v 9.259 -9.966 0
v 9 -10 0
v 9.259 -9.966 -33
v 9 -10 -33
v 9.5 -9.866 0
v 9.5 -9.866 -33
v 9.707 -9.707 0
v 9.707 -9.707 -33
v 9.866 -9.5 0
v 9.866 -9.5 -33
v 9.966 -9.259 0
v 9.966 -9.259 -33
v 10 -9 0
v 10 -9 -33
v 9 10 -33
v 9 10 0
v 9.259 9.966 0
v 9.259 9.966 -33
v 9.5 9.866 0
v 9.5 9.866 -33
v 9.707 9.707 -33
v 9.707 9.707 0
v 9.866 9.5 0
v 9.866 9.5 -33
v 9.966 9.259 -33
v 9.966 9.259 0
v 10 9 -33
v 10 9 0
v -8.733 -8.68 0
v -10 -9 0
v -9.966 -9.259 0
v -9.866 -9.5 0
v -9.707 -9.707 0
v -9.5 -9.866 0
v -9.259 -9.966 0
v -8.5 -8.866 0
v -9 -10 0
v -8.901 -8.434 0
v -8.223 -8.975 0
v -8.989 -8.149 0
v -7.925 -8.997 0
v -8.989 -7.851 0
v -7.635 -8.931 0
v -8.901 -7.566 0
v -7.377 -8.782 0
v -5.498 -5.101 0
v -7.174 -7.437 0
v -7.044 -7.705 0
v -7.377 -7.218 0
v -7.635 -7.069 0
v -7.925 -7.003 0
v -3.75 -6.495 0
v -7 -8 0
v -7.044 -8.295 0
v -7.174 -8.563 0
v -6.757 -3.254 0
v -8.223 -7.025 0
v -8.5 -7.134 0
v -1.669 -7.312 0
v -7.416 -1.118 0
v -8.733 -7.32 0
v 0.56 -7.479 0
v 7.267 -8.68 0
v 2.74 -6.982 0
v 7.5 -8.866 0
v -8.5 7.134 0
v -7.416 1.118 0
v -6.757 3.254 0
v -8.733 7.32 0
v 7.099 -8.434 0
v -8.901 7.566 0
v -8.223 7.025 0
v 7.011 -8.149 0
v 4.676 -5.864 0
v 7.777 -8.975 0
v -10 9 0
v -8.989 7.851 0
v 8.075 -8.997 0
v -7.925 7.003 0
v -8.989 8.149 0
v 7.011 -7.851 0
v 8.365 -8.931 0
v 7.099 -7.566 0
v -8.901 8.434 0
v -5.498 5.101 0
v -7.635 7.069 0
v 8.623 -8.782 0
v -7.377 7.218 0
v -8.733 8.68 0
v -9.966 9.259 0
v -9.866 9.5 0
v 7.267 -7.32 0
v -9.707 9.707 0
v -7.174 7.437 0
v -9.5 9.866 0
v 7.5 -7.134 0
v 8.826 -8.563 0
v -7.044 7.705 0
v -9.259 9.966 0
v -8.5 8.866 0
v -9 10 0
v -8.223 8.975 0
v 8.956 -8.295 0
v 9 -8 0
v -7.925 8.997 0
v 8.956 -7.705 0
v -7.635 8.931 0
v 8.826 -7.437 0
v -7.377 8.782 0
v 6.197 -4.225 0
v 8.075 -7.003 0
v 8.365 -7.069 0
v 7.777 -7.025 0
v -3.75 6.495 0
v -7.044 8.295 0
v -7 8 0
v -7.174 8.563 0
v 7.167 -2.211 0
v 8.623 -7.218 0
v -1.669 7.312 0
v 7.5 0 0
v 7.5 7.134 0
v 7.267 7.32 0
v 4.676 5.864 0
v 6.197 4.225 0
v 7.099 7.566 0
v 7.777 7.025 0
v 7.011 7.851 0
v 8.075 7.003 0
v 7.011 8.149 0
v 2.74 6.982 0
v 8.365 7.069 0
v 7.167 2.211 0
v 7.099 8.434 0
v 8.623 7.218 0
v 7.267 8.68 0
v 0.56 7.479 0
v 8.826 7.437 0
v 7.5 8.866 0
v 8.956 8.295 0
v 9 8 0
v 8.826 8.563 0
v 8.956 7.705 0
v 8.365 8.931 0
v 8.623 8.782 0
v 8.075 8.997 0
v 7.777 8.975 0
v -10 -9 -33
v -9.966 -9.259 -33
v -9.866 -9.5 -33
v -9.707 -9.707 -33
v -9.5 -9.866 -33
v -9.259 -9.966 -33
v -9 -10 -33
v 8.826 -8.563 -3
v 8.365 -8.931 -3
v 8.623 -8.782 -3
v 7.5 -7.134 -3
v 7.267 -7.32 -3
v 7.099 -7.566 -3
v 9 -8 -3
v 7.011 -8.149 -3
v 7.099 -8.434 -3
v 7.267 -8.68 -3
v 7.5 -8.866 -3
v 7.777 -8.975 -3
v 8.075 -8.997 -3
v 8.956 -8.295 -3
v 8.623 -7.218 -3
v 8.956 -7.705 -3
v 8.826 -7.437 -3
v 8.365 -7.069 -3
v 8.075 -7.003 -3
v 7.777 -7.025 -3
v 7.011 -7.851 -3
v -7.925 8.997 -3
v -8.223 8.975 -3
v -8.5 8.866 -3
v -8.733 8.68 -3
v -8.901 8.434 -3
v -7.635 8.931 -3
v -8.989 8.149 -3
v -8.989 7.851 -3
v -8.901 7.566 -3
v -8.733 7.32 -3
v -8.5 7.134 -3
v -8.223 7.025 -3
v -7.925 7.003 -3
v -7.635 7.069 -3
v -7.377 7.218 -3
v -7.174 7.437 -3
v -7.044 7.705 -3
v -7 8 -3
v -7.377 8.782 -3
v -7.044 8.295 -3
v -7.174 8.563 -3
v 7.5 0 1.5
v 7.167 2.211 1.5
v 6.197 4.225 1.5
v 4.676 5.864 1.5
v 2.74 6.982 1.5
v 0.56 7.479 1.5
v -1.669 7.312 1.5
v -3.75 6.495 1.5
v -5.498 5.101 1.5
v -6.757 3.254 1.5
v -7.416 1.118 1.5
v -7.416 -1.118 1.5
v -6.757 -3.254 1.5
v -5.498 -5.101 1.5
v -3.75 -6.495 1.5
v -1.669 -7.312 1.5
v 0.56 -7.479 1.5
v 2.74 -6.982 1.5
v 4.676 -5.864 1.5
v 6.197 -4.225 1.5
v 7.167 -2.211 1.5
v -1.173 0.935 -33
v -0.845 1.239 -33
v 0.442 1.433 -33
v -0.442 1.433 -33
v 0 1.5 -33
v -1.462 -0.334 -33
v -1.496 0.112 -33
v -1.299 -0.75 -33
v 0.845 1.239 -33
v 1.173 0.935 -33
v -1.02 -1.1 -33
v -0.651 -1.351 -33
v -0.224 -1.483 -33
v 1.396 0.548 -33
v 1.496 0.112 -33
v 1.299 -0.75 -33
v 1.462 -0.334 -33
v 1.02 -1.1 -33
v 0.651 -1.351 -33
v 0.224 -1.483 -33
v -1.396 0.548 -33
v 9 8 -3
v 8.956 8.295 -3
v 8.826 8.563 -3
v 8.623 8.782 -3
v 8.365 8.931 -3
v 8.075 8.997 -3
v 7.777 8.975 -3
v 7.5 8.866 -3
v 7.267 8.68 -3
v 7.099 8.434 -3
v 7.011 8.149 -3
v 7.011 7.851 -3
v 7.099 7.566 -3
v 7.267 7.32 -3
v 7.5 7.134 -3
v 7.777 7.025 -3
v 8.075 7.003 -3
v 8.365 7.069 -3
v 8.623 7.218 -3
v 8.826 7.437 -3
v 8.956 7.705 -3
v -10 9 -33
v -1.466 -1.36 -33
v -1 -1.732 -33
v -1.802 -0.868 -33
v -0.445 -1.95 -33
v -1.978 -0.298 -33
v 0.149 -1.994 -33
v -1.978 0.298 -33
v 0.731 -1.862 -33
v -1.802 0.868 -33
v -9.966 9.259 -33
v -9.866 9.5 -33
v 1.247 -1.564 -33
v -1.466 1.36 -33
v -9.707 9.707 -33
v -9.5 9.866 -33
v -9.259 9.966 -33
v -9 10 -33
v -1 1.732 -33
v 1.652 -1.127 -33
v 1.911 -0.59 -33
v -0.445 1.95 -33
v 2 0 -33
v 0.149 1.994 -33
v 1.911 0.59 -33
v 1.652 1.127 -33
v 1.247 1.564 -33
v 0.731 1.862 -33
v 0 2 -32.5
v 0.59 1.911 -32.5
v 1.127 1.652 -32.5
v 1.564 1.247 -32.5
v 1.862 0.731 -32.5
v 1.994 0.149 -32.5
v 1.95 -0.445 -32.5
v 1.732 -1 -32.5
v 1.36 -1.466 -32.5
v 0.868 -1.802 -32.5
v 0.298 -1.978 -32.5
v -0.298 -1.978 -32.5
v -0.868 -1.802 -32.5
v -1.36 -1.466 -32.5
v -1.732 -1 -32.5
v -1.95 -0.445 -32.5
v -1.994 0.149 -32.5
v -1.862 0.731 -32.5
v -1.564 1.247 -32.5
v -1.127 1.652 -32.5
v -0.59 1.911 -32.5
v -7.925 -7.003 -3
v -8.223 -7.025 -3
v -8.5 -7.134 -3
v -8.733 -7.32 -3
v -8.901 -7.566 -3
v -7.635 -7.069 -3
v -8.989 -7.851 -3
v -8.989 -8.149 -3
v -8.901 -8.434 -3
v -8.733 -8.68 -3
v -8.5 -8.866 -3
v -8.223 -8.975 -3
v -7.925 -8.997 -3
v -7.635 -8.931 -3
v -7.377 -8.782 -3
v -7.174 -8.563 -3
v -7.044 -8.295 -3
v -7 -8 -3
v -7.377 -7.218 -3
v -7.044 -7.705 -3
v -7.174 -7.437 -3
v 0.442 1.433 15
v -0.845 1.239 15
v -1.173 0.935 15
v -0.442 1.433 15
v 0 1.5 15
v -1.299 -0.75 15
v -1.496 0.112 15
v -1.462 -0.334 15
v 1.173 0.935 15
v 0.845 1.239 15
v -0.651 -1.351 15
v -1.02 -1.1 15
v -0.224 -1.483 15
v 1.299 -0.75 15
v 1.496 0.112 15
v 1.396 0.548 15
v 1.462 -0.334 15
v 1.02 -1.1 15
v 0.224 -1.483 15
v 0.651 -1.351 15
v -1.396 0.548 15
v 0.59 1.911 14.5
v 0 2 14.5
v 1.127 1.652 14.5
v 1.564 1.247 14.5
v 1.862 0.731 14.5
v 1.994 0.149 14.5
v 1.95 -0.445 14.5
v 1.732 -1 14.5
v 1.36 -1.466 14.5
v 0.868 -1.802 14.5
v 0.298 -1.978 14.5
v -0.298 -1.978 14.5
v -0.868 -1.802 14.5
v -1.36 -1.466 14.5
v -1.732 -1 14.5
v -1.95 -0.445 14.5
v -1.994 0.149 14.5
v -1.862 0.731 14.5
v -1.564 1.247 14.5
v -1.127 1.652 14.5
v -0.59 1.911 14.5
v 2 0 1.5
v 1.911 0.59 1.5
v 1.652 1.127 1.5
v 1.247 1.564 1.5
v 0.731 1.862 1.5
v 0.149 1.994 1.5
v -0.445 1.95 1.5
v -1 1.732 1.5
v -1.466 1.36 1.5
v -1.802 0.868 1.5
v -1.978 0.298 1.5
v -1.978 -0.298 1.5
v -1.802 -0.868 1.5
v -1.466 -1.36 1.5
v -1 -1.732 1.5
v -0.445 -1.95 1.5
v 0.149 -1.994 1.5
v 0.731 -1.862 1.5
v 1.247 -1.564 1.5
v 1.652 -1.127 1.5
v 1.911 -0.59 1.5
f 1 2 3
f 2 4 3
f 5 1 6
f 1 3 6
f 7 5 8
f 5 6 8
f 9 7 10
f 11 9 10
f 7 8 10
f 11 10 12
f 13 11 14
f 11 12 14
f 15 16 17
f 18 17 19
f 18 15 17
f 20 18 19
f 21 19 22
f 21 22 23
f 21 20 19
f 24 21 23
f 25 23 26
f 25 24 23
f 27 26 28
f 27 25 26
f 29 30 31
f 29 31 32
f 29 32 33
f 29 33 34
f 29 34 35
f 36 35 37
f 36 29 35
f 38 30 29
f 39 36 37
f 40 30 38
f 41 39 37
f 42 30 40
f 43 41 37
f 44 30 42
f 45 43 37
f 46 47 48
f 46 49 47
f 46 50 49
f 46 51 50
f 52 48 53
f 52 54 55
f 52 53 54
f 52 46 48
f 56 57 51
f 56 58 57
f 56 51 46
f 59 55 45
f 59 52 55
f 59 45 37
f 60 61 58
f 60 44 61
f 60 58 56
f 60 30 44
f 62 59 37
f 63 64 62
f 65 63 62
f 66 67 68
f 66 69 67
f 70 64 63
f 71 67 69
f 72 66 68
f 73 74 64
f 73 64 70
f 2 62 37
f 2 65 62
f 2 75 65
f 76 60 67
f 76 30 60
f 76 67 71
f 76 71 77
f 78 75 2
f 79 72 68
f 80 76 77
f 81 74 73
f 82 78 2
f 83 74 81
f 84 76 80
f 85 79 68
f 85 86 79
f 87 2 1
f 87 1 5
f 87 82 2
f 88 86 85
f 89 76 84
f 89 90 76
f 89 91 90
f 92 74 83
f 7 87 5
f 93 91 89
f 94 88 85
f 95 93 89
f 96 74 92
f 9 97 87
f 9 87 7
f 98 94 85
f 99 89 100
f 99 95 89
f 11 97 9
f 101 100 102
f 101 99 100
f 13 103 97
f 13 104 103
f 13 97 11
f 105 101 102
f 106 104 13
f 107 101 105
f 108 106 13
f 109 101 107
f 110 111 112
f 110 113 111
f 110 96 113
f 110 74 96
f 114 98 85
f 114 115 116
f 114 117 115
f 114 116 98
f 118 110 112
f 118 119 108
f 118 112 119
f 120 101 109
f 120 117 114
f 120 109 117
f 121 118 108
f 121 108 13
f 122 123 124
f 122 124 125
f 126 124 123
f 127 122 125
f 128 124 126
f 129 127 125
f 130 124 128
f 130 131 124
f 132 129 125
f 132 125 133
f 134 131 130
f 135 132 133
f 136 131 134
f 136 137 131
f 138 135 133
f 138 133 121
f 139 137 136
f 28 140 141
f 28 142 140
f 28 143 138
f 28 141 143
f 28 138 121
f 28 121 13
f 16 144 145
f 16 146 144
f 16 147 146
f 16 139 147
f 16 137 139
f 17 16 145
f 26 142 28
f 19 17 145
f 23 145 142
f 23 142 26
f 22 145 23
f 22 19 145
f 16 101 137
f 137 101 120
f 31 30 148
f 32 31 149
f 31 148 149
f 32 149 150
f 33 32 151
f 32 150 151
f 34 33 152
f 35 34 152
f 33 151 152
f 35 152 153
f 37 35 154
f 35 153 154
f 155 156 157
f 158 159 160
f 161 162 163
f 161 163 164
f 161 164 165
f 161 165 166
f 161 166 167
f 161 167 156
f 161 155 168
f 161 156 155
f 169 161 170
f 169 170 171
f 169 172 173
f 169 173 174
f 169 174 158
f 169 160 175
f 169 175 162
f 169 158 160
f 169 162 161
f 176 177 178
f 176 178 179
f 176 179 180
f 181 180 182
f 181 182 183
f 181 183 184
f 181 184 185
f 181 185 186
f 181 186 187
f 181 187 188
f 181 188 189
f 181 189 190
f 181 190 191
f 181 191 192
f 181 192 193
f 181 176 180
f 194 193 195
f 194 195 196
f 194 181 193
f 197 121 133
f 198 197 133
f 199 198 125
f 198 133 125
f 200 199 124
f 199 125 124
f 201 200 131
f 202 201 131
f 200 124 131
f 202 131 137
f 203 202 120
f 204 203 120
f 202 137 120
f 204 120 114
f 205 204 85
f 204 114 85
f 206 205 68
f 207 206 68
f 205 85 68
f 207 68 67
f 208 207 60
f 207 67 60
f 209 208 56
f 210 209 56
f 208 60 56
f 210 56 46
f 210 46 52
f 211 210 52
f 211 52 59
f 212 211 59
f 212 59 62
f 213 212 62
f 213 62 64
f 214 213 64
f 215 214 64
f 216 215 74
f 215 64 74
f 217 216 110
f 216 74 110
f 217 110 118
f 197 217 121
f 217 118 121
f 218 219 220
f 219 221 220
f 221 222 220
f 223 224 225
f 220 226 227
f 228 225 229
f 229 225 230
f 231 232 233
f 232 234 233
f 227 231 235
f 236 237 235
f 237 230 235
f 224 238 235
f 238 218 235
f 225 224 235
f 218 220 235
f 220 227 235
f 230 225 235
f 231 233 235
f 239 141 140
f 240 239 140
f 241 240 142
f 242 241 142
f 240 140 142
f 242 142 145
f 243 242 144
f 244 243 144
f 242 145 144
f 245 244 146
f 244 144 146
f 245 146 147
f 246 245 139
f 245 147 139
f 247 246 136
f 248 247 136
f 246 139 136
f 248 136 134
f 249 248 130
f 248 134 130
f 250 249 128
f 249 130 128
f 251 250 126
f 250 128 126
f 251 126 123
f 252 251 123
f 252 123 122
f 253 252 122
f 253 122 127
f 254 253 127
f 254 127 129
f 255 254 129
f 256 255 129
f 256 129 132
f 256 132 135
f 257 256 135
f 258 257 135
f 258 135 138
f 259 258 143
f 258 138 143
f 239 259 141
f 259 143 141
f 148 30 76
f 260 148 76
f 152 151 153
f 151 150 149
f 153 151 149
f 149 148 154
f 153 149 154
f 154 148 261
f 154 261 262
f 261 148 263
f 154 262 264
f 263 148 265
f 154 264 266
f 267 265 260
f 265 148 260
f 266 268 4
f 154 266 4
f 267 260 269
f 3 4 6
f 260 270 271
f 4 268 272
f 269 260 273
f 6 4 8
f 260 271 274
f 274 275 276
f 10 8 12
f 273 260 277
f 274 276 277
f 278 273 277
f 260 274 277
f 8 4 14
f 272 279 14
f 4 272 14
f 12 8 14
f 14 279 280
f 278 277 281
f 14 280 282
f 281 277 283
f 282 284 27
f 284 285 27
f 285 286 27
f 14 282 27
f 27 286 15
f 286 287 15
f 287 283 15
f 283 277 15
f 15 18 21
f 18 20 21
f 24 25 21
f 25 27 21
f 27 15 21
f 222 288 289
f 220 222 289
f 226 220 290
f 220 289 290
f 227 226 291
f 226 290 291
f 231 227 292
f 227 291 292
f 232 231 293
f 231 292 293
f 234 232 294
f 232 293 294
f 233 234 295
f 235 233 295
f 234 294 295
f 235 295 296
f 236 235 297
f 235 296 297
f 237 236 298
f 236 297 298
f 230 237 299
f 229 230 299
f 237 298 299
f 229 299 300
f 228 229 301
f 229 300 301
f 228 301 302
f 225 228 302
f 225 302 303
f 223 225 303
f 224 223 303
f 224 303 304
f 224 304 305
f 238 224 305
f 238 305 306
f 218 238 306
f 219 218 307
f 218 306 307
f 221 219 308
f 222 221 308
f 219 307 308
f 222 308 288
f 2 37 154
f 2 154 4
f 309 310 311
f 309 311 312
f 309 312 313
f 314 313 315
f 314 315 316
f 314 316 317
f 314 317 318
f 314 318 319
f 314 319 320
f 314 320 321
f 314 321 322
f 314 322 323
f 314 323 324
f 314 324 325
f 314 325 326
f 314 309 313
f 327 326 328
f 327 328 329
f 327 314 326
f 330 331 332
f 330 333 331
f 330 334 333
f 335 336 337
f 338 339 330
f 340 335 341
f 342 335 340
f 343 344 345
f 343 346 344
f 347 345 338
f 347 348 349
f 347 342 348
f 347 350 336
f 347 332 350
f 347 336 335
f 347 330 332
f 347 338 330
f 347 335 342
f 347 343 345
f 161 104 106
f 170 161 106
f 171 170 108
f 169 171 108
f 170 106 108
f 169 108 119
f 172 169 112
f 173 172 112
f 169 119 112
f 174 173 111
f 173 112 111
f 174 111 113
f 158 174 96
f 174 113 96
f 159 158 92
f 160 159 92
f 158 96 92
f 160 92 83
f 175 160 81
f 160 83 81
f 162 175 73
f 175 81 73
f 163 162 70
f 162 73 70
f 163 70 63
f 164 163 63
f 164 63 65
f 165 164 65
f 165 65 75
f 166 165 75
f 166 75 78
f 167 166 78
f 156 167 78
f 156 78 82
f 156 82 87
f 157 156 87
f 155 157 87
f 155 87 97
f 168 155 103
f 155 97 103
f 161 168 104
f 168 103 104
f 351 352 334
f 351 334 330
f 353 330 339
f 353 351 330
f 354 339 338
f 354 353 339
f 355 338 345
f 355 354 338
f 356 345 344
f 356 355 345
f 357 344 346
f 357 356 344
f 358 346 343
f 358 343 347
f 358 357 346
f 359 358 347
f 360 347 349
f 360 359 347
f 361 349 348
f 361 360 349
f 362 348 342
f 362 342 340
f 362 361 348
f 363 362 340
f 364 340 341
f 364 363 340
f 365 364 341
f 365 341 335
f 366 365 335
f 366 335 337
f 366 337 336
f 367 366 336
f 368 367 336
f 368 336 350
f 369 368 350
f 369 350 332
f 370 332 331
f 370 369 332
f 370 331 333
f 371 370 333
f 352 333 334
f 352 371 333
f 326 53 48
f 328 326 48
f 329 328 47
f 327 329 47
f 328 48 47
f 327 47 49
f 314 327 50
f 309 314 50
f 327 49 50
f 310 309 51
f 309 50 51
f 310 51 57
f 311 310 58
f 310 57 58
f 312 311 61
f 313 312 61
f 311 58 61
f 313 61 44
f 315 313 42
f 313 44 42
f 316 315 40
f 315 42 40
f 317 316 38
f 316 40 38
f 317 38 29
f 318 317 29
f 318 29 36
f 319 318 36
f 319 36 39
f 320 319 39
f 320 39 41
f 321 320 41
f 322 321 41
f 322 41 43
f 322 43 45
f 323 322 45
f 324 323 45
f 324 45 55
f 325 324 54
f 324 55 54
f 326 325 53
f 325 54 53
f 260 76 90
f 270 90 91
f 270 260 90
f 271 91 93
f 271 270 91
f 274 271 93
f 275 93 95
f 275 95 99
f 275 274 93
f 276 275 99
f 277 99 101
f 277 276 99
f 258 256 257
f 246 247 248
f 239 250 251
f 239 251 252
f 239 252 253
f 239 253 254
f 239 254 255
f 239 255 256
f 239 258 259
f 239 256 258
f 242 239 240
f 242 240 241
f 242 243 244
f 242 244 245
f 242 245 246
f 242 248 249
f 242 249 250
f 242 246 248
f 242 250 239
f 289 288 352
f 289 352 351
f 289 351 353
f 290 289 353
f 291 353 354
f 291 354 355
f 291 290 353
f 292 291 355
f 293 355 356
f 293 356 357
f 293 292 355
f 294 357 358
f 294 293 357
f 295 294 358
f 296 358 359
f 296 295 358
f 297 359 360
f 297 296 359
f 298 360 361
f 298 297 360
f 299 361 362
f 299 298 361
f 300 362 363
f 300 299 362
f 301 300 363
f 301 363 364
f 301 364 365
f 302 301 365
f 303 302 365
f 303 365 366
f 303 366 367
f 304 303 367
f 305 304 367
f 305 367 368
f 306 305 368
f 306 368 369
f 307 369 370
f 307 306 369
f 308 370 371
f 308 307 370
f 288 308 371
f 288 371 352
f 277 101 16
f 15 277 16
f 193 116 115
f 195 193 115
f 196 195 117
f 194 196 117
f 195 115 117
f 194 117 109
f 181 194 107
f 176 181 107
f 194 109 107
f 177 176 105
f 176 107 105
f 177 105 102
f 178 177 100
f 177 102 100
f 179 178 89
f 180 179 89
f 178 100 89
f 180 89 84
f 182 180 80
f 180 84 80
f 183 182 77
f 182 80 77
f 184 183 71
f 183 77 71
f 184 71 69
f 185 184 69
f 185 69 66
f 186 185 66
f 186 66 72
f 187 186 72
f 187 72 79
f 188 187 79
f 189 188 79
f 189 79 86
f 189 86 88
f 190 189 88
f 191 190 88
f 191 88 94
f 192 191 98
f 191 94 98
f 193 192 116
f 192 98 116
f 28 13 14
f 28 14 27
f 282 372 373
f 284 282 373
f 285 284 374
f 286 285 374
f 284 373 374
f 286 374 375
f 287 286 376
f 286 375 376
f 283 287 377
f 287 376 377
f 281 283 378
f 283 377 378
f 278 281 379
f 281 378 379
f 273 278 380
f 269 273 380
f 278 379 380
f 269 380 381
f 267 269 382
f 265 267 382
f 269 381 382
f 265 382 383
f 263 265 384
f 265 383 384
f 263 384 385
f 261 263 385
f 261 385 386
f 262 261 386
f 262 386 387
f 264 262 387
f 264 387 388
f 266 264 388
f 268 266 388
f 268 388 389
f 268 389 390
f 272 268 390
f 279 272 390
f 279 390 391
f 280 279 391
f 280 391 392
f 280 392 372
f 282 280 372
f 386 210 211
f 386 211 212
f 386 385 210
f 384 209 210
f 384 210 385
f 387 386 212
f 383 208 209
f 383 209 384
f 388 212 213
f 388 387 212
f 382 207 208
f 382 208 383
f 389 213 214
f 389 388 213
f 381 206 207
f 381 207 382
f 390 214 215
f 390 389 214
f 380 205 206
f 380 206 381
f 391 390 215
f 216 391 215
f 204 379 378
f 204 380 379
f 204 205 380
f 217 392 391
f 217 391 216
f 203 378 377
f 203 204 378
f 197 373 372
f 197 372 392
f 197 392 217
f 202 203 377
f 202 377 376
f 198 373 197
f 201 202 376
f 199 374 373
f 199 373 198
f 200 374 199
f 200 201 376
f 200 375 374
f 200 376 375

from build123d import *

# Parameters (mm, degrees)
SKETCH1_W           = 20
SKETCH1_H           = 20
BOSS_EXTRUDE1_DEPTH = 33
SKETCH2_R           = 7.5
BOSS_EXTRUDE2_DEPTH = 1.5
SKETCH3_R           = 2
CUT_EXTRUDE1_DEPTH  = 35.5
FILLET1_R           = 1
SKETCH4_R           = 1
CUT_EXTRUDE2_DEPTH  = 3
SKETCH5_W           = 48
SKETCH5_H           = 2
CHAMFER1_SIZE       = 0.5


with BuildPart() as part:
    # Sketch1 → Boss-Extrude1 (new body)
    with BuildSketch(Plane.XY):
        Rectangle(SKETCH1_W, SKETCH1_H)
    extrude(amount=-BOSS_EXTRUDE1_DEPTH)

    # Sketch2 → Boss-Extrude2 (add)
    with BuildSketch(Plane.XY):
        Circle(SKETCH2_R)
    extrude(amount=BOSS_EXTRUDE2_DEPTH)

    # Sketch3 → Cut-Extrude1 (cut, through all)
    with BuildSketch(Plane.XY.offset(1.5)):
        Circle(SKETCH3_R)
    extrude(amount=-CUT_EXTRUDE1_DEPTH, mode=Mode.SUBTRACT)

    # Fillet1
    fillet1_edges = [part.edges().sort_by_distance(p)[0] for p in [
        (-10, 10, -16.5),
        (10, 10, -16.5),
        (10, -10, -16.5),
        (-10, -10, -16.5),
    ]]
    fillet(fillet1_edges, radius=FILLET1_R)

    # Sketch4 → Cut-Extrude2 (cut)
    with BuildSketch(Plane.XY):
        with Locations((8, 8)):
            Circle(SKETCH4_R)
        with Locations((-8, 8)):
            Circle(SKETCH4_R)
        with Locations((-8, -8)):
            Circle(SKETCH4_R)
        with Locations((8, -8)):
            Circle(SKETCH4_R)
    extrude(amount=-CUT_EXTRUDE2_DEPTH, mode=Mode.SUBTRACT)


with BuildPart() as body_2:
    # Sketch5 → Revolve1 (revolve)
    with BuildSketch(Plane(origin=(0, 0, 0), x_dir=(0, 0, -1), z_dir=(1, 0, 0))):
        with Locations((9, 1)):
            Rectangle(SKETCH5_W, SKETCH5_H)
    revolve(axis=Axis((0, 0, 32.857523653), (0, 0, -1)))

    # Chamfer1
    chamfer1_edges = [body_2.edges().sort_by_distance(p)[0] for p in [
        (0, -2, 15),
        (0, -2, -33),
    ]]
    chamfer(chamfer1_edges, length=CHAMFER1_SIZE)


solid = Compound([part.part, body_2.part])
